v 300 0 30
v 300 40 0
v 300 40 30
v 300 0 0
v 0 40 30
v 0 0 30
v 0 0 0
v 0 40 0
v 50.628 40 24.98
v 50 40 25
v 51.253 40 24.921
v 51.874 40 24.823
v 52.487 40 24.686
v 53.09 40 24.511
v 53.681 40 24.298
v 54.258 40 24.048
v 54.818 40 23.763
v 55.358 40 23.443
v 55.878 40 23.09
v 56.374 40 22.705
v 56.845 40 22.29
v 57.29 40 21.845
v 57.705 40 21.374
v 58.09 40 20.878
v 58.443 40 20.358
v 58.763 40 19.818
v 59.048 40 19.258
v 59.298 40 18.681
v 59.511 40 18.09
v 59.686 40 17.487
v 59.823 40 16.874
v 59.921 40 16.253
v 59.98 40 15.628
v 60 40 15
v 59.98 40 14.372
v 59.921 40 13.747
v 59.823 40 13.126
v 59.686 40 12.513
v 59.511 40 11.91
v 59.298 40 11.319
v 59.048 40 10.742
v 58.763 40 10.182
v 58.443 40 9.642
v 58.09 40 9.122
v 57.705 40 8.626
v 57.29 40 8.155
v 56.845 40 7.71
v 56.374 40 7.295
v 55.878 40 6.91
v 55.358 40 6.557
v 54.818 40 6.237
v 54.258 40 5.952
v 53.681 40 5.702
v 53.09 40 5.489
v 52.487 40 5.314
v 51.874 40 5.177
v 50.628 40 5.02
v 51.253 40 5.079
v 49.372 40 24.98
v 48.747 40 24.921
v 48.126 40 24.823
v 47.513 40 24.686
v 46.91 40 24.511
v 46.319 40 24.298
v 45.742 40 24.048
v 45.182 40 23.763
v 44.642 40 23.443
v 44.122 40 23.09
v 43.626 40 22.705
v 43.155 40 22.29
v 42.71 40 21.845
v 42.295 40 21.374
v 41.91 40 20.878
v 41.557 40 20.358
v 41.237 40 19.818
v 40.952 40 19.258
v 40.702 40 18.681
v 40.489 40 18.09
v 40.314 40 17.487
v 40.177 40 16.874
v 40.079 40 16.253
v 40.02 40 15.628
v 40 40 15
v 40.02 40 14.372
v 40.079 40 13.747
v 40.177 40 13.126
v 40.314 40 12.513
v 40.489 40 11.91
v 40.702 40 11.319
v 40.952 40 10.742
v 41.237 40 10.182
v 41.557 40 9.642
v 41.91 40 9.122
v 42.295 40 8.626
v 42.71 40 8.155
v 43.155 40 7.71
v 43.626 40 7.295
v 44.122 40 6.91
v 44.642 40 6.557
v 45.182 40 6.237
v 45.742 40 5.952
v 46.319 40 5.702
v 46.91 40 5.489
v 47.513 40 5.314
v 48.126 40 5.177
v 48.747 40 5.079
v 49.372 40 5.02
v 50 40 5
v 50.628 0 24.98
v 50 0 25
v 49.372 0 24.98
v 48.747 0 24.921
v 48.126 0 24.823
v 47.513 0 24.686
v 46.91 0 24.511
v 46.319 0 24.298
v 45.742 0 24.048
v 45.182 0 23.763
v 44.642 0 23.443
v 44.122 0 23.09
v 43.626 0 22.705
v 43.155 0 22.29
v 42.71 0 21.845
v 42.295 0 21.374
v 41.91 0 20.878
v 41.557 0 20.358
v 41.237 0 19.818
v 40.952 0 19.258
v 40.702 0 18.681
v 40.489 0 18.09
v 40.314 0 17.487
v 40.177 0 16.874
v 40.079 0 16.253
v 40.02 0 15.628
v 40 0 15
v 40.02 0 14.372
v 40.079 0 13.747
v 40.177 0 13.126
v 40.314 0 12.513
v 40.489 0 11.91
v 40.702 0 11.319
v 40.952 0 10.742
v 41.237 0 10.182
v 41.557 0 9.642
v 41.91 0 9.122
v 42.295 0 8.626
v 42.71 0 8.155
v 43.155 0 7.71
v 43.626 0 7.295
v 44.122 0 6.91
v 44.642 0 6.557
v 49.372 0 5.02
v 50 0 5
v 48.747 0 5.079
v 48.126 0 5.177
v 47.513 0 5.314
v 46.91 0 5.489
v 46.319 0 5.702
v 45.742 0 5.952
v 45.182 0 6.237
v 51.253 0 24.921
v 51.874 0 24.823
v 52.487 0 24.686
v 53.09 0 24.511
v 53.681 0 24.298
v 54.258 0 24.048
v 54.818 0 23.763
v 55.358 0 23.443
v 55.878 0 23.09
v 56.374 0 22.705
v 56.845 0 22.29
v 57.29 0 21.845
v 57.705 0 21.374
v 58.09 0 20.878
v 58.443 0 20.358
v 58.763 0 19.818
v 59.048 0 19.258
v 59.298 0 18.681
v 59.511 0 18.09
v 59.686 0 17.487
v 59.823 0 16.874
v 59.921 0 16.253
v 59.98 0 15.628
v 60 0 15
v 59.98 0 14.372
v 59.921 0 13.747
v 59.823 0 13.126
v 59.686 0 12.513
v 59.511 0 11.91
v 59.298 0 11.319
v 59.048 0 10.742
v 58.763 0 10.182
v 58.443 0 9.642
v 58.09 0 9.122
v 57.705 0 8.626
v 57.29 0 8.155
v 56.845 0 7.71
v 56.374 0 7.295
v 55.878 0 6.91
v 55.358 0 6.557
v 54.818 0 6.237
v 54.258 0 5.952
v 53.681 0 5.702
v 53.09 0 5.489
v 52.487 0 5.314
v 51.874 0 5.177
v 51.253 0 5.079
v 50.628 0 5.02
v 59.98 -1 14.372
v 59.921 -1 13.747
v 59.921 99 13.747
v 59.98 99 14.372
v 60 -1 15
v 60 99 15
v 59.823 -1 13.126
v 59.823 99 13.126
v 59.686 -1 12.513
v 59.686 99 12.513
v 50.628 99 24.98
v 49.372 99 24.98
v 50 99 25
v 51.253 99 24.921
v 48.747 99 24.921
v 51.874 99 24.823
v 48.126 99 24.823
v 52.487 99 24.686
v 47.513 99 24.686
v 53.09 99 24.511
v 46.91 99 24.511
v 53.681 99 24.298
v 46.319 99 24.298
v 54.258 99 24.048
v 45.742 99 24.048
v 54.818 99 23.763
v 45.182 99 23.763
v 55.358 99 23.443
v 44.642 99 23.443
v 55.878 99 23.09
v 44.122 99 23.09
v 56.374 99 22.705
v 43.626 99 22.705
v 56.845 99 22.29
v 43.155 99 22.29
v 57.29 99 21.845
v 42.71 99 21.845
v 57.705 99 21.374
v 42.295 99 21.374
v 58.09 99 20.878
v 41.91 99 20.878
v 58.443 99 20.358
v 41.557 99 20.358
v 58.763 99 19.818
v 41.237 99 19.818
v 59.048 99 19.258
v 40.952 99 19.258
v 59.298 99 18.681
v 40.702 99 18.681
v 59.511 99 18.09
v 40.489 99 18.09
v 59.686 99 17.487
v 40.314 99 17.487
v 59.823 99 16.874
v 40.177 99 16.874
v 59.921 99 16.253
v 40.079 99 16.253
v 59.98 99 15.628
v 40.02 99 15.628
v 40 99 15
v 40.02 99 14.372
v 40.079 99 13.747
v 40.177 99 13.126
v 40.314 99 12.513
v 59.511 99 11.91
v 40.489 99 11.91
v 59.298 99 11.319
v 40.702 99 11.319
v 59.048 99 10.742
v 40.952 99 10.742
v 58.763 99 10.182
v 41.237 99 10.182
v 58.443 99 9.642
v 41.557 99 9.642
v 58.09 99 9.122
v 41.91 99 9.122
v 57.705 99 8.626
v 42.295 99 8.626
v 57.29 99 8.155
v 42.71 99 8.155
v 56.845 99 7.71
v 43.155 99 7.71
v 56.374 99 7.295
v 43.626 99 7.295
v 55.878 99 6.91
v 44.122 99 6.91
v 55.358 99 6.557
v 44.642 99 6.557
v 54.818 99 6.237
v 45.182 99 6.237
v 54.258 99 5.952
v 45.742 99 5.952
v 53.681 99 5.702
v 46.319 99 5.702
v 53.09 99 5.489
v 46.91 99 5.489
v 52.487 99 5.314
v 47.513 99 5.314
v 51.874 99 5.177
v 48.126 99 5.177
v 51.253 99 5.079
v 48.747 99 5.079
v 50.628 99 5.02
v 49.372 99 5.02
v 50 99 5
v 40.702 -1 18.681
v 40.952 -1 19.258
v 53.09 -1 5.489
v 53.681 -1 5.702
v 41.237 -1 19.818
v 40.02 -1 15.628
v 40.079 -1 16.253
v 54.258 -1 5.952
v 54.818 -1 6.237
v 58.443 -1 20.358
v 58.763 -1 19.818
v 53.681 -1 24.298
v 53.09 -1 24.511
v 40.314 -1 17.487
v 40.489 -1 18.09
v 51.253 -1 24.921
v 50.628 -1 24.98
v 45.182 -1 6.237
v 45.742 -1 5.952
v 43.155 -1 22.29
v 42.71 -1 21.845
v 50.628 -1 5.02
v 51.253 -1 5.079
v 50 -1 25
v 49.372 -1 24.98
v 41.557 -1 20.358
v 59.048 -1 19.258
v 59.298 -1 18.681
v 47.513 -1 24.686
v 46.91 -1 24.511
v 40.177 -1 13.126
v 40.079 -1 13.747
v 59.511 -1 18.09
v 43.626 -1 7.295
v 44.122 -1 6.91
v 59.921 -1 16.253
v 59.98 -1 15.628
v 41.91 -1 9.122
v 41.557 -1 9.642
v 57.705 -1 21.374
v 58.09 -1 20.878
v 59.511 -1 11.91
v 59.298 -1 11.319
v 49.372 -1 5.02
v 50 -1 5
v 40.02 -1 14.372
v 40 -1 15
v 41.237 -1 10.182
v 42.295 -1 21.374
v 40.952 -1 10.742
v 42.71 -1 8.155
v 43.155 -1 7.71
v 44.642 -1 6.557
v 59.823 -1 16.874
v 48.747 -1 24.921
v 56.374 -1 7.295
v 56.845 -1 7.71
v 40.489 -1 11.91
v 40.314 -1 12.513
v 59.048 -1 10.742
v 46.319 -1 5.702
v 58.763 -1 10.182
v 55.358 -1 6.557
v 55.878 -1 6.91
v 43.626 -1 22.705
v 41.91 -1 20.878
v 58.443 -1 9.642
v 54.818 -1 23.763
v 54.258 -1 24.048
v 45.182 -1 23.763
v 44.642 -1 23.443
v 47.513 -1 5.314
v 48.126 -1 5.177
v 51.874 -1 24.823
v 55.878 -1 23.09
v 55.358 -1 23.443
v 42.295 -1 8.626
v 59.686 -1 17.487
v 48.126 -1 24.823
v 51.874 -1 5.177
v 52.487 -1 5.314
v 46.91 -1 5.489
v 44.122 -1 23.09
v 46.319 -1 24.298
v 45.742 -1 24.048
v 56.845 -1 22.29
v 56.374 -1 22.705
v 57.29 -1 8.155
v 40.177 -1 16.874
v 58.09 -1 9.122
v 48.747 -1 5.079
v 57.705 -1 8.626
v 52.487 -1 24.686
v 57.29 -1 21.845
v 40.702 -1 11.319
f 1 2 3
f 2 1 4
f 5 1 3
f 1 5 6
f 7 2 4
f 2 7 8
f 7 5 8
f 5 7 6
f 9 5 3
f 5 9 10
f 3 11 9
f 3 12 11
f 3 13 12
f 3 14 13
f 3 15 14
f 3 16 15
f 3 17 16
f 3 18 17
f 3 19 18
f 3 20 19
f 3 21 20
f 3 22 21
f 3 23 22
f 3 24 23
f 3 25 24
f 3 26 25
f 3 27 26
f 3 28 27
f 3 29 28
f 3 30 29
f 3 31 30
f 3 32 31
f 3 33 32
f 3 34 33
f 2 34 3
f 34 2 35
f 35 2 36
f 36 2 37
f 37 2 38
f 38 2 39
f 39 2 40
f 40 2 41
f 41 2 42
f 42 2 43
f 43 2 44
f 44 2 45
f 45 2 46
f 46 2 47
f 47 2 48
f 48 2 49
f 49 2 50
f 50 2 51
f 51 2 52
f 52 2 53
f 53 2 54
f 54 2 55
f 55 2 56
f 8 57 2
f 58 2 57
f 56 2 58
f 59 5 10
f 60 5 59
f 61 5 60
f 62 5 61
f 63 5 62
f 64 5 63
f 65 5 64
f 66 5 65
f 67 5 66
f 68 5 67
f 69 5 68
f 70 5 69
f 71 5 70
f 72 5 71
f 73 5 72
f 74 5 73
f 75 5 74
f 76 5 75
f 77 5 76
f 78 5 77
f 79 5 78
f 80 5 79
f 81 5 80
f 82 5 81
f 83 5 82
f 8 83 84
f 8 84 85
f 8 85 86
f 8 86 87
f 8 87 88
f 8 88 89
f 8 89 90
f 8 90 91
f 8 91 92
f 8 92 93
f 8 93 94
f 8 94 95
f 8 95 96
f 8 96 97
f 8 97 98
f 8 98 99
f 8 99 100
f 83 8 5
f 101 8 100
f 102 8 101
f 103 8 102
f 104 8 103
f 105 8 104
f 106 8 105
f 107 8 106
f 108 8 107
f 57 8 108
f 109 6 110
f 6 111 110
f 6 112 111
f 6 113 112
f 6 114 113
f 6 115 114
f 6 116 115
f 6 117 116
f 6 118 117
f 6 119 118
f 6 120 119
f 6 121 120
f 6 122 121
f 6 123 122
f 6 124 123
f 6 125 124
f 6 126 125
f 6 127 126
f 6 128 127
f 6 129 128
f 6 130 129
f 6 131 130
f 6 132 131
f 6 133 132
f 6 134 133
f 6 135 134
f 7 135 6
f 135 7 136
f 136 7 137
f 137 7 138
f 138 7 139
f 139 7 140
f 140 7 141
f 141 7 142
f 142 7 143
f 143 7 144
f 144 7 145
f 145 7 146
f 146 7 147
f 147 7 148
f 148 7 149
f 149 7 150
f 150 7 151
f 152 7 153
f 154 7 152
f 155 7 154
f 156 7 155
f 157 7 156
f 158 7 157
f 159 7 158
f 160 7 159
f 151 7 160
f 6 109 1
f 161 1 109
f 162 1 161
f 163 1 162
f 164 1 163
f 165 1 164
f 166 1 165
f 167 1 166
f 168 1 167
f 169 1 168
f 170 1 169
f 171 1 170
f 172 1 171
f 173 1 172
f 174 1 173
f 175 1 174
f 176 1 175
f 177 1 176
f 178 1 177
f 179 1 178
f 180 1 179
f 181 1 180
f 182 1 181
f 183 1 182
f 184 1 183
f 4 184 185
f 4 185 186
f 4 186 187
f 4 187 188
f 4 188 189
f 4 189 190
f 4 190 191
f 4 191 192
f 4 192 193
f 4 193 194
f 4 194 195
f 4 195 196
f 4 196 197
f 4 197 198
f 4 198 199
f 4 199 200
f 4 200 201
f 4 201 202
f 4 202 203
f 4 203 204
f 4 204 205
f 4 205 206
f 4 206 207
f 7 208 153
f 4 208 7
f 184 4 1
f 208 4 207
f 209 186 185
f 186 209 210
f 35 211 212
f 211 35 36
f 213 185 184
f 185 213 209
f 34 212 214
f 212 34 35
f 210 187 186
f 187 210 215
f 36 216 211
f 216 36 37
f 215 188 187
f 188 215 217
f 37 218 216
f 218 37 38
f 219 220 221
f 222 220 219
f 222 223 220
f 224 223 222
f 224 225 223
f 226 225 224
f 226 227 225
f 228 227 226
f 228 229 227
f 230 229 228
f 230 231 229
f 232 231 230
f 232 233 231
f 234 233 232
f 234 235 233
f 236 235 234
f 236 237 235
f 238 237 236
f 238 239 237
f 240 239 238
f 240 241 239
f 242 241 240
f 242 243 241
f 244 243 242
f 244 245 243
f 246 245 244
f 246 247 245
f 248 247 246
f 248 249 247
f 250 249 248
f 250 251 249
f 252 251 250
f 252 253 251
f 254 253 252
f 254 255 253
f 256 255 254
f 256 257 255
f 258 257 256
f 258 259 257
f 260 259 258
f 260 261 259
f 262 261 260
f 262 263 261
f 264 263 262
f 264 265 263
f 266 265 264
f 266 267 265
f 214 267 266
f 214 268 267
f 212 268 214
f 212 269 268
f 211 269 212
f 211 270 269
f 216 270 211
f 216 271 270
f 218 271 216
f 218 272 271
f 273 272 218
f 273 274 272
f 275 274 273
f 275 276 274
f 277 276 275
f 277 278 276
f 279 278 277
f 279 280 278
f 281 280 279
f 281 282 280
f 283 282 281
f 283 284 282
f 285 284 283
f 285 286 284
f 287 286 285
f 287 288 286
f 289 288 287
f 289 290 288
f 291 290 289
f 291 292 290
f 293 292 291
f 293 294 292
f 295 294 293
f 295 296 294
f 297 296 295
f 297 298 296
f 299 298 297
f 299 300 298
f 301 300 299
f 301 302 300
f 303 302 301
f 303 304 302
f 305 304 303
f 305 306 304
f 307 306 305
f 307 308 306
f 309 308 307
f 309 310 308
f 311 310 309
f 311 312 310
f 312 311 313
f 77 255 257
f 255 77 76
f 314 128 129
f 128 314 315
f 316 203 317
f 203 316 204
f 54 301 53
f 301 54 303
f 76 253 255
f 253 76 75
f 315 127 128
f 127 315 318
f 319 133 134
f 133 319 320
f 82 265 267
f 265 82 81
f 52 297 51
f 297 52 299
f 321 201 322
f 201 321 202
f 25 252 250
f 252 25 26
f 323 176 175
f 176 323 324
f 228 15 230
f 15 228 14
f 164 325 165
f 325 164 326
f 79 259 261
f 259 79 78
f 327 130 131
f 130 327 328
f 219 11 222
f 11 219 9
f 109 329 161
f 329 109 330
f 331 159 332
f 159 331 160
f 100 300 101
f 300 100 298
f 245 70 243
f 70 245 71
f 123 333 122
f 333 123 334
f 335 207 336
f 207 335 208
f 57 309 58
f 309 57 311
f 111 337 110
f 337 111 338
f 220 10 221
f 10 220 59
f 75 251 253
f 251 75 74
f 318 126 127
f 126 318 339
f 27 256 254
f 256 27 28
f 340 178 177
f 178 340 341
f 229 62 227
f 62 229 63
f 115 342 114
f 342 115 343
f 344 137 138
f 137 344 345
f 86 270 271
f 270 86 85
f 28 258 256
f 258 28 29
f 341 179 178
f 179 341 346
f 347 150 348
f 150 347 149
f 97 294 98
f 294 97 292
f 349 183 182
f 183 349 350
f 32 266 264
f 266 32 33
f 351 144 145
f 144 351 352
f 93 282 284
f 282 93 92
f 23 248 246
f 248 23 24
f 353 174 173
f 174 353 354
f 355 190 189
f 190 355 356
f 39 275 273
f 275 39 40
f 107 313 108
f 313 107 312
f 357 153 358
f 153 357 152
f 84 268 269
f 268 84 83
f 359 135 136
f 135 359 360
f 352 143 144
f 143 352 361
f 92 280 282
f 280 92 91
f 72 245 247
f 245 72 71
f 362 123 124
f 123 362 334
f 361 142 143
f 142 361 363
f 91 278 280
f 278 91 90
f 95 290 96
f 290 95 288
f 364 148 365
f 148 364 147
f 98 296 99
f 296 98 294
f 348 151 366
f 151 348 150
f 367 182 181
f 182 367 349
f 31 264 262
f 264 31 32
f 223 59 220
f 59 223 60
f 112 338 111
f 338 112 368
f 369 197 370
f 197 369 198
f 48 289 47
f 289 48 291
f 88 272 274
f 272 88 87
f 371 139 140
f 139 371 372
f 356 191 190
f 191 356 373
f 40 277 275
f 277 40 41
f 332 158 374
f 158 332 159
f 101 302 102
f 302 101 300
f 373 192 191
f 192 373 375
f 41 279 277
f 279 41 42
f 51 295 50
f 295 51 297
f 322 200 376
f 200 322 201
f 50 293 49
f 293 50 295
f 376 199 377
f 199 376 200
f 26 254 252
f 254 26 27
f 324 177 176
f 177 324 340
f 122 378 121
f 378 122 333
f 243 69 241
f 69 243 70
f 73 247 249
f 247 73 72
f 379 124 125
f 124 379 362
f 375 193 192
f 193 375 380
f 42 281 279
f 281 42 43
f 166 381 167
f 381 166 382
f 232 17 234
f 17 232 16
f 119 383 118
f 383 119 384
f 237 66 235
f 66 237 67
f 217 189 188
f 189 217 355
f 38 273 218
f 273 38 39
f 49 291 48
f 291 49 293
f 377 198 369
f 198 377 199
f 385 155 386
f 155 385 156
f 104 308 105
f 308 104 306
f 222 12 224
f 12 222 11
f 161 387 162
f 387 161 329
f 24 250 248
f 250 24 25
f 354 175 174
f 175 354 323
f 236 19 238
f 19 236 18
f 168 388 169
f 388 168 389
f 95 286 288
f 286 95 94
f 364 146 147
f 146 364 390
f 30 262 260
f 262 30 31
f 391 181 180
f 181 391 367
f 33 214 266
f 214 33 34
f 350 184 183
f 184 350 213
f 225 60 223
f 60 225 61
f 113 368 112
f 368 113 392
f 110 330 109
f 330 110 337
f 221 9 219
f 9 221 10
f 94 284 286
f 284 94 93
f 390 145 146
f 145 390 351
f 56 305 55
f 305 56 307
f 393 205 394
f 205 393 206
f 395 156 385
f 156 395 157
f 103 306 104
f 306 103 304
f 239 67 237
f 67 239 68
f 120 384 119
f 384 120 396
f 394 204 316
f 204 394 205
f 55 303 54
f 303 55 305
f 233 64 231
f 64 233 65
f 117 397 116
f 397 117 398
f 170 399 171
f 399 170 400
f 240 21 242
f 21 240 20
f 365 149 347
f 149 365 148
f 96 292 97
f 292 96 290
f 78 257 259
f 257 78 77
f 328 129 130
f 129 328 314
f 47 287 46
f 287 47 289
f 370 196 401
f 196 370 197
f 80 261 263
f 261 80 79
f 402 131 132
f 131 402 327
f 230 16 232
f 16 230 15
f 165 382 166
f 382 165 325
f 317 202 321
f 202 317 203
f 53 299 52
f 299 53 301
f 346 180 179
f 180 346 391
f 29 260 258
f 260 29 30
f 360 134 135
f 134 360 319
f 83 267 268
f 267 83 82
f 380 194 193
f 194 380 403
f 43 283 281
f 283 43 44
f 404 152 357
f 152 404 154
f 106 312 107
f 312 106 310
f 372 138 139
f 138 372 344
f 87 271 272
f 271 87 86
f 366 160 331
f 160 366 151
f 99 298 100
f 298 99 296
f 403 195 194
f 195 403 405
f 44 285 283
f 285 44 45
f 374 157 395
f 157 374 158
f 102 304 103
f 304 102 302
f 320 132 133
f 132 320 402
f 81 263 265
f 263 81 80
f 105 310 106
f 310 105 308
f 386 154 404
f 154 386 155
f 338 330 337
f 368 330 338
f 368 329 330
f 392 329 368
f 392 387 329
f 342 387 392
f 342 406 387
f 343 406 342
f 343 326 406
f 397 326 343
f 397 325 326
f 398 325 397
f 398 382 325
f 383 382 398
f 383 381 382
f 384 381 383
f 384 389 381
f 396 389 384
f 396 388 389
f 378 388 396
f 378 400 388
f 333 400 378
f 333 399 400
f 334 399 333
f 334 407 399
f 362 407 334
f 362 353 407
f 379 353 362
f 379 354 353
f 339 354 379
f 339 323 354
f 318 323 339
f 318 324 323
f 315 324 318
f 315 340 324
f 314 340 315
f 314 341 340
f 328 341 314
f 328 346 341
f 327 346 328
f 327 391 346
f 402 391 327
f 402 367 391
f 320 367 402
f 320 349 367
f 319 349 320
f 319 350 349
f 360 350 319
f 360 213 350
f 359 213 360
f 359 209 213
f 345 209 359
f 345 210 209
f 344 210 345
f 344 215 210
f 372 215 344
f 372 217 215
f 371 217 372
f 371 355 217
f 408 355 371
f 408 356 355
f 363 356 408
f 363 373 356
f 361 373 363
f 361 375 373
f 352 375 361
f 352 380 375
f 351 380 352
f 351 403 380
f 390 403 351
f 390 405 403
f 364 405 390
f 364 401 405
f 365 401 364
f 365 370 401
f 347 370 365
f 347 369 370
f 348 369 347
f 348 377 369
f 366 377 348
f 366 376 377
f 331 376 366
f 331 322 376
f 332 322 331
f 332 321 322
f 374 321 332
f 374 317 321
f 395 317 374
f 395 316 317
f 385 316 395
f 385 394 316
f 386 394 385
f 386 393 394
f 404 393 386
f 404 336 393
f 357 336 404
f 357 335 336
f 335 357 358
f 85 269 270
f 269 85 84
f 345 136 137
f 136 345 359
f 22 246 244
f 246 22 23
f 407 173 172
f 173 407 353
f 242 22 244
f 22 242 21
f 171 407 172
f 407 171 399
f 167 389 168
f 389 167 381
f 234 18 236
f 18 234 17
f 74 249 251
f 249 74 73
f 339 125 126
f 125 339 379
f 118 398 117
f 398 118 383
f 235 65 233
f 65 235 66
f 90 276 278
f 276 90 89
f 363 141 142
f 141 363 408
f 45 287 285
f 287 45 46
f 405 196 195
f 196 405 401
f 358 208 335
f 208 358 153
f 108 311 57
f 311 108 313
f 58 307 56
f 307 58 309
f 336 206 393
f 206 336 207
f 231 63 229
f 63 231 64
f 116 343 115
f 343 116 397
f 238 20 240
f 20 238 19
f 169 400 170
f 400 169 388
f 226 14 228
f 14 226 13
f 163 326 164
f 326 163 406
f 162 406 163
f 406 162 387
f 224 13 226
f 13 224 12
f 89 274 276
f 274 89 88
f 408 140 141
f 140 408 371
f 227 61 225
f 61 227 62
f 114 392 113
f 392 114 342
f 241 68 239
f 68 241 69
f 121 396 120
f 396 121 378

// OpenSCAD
$fn=100;

cube([300,40,30]);

translate([50,-1,15])rotate([-90,0,0])cylinder(d=20,h=100);
